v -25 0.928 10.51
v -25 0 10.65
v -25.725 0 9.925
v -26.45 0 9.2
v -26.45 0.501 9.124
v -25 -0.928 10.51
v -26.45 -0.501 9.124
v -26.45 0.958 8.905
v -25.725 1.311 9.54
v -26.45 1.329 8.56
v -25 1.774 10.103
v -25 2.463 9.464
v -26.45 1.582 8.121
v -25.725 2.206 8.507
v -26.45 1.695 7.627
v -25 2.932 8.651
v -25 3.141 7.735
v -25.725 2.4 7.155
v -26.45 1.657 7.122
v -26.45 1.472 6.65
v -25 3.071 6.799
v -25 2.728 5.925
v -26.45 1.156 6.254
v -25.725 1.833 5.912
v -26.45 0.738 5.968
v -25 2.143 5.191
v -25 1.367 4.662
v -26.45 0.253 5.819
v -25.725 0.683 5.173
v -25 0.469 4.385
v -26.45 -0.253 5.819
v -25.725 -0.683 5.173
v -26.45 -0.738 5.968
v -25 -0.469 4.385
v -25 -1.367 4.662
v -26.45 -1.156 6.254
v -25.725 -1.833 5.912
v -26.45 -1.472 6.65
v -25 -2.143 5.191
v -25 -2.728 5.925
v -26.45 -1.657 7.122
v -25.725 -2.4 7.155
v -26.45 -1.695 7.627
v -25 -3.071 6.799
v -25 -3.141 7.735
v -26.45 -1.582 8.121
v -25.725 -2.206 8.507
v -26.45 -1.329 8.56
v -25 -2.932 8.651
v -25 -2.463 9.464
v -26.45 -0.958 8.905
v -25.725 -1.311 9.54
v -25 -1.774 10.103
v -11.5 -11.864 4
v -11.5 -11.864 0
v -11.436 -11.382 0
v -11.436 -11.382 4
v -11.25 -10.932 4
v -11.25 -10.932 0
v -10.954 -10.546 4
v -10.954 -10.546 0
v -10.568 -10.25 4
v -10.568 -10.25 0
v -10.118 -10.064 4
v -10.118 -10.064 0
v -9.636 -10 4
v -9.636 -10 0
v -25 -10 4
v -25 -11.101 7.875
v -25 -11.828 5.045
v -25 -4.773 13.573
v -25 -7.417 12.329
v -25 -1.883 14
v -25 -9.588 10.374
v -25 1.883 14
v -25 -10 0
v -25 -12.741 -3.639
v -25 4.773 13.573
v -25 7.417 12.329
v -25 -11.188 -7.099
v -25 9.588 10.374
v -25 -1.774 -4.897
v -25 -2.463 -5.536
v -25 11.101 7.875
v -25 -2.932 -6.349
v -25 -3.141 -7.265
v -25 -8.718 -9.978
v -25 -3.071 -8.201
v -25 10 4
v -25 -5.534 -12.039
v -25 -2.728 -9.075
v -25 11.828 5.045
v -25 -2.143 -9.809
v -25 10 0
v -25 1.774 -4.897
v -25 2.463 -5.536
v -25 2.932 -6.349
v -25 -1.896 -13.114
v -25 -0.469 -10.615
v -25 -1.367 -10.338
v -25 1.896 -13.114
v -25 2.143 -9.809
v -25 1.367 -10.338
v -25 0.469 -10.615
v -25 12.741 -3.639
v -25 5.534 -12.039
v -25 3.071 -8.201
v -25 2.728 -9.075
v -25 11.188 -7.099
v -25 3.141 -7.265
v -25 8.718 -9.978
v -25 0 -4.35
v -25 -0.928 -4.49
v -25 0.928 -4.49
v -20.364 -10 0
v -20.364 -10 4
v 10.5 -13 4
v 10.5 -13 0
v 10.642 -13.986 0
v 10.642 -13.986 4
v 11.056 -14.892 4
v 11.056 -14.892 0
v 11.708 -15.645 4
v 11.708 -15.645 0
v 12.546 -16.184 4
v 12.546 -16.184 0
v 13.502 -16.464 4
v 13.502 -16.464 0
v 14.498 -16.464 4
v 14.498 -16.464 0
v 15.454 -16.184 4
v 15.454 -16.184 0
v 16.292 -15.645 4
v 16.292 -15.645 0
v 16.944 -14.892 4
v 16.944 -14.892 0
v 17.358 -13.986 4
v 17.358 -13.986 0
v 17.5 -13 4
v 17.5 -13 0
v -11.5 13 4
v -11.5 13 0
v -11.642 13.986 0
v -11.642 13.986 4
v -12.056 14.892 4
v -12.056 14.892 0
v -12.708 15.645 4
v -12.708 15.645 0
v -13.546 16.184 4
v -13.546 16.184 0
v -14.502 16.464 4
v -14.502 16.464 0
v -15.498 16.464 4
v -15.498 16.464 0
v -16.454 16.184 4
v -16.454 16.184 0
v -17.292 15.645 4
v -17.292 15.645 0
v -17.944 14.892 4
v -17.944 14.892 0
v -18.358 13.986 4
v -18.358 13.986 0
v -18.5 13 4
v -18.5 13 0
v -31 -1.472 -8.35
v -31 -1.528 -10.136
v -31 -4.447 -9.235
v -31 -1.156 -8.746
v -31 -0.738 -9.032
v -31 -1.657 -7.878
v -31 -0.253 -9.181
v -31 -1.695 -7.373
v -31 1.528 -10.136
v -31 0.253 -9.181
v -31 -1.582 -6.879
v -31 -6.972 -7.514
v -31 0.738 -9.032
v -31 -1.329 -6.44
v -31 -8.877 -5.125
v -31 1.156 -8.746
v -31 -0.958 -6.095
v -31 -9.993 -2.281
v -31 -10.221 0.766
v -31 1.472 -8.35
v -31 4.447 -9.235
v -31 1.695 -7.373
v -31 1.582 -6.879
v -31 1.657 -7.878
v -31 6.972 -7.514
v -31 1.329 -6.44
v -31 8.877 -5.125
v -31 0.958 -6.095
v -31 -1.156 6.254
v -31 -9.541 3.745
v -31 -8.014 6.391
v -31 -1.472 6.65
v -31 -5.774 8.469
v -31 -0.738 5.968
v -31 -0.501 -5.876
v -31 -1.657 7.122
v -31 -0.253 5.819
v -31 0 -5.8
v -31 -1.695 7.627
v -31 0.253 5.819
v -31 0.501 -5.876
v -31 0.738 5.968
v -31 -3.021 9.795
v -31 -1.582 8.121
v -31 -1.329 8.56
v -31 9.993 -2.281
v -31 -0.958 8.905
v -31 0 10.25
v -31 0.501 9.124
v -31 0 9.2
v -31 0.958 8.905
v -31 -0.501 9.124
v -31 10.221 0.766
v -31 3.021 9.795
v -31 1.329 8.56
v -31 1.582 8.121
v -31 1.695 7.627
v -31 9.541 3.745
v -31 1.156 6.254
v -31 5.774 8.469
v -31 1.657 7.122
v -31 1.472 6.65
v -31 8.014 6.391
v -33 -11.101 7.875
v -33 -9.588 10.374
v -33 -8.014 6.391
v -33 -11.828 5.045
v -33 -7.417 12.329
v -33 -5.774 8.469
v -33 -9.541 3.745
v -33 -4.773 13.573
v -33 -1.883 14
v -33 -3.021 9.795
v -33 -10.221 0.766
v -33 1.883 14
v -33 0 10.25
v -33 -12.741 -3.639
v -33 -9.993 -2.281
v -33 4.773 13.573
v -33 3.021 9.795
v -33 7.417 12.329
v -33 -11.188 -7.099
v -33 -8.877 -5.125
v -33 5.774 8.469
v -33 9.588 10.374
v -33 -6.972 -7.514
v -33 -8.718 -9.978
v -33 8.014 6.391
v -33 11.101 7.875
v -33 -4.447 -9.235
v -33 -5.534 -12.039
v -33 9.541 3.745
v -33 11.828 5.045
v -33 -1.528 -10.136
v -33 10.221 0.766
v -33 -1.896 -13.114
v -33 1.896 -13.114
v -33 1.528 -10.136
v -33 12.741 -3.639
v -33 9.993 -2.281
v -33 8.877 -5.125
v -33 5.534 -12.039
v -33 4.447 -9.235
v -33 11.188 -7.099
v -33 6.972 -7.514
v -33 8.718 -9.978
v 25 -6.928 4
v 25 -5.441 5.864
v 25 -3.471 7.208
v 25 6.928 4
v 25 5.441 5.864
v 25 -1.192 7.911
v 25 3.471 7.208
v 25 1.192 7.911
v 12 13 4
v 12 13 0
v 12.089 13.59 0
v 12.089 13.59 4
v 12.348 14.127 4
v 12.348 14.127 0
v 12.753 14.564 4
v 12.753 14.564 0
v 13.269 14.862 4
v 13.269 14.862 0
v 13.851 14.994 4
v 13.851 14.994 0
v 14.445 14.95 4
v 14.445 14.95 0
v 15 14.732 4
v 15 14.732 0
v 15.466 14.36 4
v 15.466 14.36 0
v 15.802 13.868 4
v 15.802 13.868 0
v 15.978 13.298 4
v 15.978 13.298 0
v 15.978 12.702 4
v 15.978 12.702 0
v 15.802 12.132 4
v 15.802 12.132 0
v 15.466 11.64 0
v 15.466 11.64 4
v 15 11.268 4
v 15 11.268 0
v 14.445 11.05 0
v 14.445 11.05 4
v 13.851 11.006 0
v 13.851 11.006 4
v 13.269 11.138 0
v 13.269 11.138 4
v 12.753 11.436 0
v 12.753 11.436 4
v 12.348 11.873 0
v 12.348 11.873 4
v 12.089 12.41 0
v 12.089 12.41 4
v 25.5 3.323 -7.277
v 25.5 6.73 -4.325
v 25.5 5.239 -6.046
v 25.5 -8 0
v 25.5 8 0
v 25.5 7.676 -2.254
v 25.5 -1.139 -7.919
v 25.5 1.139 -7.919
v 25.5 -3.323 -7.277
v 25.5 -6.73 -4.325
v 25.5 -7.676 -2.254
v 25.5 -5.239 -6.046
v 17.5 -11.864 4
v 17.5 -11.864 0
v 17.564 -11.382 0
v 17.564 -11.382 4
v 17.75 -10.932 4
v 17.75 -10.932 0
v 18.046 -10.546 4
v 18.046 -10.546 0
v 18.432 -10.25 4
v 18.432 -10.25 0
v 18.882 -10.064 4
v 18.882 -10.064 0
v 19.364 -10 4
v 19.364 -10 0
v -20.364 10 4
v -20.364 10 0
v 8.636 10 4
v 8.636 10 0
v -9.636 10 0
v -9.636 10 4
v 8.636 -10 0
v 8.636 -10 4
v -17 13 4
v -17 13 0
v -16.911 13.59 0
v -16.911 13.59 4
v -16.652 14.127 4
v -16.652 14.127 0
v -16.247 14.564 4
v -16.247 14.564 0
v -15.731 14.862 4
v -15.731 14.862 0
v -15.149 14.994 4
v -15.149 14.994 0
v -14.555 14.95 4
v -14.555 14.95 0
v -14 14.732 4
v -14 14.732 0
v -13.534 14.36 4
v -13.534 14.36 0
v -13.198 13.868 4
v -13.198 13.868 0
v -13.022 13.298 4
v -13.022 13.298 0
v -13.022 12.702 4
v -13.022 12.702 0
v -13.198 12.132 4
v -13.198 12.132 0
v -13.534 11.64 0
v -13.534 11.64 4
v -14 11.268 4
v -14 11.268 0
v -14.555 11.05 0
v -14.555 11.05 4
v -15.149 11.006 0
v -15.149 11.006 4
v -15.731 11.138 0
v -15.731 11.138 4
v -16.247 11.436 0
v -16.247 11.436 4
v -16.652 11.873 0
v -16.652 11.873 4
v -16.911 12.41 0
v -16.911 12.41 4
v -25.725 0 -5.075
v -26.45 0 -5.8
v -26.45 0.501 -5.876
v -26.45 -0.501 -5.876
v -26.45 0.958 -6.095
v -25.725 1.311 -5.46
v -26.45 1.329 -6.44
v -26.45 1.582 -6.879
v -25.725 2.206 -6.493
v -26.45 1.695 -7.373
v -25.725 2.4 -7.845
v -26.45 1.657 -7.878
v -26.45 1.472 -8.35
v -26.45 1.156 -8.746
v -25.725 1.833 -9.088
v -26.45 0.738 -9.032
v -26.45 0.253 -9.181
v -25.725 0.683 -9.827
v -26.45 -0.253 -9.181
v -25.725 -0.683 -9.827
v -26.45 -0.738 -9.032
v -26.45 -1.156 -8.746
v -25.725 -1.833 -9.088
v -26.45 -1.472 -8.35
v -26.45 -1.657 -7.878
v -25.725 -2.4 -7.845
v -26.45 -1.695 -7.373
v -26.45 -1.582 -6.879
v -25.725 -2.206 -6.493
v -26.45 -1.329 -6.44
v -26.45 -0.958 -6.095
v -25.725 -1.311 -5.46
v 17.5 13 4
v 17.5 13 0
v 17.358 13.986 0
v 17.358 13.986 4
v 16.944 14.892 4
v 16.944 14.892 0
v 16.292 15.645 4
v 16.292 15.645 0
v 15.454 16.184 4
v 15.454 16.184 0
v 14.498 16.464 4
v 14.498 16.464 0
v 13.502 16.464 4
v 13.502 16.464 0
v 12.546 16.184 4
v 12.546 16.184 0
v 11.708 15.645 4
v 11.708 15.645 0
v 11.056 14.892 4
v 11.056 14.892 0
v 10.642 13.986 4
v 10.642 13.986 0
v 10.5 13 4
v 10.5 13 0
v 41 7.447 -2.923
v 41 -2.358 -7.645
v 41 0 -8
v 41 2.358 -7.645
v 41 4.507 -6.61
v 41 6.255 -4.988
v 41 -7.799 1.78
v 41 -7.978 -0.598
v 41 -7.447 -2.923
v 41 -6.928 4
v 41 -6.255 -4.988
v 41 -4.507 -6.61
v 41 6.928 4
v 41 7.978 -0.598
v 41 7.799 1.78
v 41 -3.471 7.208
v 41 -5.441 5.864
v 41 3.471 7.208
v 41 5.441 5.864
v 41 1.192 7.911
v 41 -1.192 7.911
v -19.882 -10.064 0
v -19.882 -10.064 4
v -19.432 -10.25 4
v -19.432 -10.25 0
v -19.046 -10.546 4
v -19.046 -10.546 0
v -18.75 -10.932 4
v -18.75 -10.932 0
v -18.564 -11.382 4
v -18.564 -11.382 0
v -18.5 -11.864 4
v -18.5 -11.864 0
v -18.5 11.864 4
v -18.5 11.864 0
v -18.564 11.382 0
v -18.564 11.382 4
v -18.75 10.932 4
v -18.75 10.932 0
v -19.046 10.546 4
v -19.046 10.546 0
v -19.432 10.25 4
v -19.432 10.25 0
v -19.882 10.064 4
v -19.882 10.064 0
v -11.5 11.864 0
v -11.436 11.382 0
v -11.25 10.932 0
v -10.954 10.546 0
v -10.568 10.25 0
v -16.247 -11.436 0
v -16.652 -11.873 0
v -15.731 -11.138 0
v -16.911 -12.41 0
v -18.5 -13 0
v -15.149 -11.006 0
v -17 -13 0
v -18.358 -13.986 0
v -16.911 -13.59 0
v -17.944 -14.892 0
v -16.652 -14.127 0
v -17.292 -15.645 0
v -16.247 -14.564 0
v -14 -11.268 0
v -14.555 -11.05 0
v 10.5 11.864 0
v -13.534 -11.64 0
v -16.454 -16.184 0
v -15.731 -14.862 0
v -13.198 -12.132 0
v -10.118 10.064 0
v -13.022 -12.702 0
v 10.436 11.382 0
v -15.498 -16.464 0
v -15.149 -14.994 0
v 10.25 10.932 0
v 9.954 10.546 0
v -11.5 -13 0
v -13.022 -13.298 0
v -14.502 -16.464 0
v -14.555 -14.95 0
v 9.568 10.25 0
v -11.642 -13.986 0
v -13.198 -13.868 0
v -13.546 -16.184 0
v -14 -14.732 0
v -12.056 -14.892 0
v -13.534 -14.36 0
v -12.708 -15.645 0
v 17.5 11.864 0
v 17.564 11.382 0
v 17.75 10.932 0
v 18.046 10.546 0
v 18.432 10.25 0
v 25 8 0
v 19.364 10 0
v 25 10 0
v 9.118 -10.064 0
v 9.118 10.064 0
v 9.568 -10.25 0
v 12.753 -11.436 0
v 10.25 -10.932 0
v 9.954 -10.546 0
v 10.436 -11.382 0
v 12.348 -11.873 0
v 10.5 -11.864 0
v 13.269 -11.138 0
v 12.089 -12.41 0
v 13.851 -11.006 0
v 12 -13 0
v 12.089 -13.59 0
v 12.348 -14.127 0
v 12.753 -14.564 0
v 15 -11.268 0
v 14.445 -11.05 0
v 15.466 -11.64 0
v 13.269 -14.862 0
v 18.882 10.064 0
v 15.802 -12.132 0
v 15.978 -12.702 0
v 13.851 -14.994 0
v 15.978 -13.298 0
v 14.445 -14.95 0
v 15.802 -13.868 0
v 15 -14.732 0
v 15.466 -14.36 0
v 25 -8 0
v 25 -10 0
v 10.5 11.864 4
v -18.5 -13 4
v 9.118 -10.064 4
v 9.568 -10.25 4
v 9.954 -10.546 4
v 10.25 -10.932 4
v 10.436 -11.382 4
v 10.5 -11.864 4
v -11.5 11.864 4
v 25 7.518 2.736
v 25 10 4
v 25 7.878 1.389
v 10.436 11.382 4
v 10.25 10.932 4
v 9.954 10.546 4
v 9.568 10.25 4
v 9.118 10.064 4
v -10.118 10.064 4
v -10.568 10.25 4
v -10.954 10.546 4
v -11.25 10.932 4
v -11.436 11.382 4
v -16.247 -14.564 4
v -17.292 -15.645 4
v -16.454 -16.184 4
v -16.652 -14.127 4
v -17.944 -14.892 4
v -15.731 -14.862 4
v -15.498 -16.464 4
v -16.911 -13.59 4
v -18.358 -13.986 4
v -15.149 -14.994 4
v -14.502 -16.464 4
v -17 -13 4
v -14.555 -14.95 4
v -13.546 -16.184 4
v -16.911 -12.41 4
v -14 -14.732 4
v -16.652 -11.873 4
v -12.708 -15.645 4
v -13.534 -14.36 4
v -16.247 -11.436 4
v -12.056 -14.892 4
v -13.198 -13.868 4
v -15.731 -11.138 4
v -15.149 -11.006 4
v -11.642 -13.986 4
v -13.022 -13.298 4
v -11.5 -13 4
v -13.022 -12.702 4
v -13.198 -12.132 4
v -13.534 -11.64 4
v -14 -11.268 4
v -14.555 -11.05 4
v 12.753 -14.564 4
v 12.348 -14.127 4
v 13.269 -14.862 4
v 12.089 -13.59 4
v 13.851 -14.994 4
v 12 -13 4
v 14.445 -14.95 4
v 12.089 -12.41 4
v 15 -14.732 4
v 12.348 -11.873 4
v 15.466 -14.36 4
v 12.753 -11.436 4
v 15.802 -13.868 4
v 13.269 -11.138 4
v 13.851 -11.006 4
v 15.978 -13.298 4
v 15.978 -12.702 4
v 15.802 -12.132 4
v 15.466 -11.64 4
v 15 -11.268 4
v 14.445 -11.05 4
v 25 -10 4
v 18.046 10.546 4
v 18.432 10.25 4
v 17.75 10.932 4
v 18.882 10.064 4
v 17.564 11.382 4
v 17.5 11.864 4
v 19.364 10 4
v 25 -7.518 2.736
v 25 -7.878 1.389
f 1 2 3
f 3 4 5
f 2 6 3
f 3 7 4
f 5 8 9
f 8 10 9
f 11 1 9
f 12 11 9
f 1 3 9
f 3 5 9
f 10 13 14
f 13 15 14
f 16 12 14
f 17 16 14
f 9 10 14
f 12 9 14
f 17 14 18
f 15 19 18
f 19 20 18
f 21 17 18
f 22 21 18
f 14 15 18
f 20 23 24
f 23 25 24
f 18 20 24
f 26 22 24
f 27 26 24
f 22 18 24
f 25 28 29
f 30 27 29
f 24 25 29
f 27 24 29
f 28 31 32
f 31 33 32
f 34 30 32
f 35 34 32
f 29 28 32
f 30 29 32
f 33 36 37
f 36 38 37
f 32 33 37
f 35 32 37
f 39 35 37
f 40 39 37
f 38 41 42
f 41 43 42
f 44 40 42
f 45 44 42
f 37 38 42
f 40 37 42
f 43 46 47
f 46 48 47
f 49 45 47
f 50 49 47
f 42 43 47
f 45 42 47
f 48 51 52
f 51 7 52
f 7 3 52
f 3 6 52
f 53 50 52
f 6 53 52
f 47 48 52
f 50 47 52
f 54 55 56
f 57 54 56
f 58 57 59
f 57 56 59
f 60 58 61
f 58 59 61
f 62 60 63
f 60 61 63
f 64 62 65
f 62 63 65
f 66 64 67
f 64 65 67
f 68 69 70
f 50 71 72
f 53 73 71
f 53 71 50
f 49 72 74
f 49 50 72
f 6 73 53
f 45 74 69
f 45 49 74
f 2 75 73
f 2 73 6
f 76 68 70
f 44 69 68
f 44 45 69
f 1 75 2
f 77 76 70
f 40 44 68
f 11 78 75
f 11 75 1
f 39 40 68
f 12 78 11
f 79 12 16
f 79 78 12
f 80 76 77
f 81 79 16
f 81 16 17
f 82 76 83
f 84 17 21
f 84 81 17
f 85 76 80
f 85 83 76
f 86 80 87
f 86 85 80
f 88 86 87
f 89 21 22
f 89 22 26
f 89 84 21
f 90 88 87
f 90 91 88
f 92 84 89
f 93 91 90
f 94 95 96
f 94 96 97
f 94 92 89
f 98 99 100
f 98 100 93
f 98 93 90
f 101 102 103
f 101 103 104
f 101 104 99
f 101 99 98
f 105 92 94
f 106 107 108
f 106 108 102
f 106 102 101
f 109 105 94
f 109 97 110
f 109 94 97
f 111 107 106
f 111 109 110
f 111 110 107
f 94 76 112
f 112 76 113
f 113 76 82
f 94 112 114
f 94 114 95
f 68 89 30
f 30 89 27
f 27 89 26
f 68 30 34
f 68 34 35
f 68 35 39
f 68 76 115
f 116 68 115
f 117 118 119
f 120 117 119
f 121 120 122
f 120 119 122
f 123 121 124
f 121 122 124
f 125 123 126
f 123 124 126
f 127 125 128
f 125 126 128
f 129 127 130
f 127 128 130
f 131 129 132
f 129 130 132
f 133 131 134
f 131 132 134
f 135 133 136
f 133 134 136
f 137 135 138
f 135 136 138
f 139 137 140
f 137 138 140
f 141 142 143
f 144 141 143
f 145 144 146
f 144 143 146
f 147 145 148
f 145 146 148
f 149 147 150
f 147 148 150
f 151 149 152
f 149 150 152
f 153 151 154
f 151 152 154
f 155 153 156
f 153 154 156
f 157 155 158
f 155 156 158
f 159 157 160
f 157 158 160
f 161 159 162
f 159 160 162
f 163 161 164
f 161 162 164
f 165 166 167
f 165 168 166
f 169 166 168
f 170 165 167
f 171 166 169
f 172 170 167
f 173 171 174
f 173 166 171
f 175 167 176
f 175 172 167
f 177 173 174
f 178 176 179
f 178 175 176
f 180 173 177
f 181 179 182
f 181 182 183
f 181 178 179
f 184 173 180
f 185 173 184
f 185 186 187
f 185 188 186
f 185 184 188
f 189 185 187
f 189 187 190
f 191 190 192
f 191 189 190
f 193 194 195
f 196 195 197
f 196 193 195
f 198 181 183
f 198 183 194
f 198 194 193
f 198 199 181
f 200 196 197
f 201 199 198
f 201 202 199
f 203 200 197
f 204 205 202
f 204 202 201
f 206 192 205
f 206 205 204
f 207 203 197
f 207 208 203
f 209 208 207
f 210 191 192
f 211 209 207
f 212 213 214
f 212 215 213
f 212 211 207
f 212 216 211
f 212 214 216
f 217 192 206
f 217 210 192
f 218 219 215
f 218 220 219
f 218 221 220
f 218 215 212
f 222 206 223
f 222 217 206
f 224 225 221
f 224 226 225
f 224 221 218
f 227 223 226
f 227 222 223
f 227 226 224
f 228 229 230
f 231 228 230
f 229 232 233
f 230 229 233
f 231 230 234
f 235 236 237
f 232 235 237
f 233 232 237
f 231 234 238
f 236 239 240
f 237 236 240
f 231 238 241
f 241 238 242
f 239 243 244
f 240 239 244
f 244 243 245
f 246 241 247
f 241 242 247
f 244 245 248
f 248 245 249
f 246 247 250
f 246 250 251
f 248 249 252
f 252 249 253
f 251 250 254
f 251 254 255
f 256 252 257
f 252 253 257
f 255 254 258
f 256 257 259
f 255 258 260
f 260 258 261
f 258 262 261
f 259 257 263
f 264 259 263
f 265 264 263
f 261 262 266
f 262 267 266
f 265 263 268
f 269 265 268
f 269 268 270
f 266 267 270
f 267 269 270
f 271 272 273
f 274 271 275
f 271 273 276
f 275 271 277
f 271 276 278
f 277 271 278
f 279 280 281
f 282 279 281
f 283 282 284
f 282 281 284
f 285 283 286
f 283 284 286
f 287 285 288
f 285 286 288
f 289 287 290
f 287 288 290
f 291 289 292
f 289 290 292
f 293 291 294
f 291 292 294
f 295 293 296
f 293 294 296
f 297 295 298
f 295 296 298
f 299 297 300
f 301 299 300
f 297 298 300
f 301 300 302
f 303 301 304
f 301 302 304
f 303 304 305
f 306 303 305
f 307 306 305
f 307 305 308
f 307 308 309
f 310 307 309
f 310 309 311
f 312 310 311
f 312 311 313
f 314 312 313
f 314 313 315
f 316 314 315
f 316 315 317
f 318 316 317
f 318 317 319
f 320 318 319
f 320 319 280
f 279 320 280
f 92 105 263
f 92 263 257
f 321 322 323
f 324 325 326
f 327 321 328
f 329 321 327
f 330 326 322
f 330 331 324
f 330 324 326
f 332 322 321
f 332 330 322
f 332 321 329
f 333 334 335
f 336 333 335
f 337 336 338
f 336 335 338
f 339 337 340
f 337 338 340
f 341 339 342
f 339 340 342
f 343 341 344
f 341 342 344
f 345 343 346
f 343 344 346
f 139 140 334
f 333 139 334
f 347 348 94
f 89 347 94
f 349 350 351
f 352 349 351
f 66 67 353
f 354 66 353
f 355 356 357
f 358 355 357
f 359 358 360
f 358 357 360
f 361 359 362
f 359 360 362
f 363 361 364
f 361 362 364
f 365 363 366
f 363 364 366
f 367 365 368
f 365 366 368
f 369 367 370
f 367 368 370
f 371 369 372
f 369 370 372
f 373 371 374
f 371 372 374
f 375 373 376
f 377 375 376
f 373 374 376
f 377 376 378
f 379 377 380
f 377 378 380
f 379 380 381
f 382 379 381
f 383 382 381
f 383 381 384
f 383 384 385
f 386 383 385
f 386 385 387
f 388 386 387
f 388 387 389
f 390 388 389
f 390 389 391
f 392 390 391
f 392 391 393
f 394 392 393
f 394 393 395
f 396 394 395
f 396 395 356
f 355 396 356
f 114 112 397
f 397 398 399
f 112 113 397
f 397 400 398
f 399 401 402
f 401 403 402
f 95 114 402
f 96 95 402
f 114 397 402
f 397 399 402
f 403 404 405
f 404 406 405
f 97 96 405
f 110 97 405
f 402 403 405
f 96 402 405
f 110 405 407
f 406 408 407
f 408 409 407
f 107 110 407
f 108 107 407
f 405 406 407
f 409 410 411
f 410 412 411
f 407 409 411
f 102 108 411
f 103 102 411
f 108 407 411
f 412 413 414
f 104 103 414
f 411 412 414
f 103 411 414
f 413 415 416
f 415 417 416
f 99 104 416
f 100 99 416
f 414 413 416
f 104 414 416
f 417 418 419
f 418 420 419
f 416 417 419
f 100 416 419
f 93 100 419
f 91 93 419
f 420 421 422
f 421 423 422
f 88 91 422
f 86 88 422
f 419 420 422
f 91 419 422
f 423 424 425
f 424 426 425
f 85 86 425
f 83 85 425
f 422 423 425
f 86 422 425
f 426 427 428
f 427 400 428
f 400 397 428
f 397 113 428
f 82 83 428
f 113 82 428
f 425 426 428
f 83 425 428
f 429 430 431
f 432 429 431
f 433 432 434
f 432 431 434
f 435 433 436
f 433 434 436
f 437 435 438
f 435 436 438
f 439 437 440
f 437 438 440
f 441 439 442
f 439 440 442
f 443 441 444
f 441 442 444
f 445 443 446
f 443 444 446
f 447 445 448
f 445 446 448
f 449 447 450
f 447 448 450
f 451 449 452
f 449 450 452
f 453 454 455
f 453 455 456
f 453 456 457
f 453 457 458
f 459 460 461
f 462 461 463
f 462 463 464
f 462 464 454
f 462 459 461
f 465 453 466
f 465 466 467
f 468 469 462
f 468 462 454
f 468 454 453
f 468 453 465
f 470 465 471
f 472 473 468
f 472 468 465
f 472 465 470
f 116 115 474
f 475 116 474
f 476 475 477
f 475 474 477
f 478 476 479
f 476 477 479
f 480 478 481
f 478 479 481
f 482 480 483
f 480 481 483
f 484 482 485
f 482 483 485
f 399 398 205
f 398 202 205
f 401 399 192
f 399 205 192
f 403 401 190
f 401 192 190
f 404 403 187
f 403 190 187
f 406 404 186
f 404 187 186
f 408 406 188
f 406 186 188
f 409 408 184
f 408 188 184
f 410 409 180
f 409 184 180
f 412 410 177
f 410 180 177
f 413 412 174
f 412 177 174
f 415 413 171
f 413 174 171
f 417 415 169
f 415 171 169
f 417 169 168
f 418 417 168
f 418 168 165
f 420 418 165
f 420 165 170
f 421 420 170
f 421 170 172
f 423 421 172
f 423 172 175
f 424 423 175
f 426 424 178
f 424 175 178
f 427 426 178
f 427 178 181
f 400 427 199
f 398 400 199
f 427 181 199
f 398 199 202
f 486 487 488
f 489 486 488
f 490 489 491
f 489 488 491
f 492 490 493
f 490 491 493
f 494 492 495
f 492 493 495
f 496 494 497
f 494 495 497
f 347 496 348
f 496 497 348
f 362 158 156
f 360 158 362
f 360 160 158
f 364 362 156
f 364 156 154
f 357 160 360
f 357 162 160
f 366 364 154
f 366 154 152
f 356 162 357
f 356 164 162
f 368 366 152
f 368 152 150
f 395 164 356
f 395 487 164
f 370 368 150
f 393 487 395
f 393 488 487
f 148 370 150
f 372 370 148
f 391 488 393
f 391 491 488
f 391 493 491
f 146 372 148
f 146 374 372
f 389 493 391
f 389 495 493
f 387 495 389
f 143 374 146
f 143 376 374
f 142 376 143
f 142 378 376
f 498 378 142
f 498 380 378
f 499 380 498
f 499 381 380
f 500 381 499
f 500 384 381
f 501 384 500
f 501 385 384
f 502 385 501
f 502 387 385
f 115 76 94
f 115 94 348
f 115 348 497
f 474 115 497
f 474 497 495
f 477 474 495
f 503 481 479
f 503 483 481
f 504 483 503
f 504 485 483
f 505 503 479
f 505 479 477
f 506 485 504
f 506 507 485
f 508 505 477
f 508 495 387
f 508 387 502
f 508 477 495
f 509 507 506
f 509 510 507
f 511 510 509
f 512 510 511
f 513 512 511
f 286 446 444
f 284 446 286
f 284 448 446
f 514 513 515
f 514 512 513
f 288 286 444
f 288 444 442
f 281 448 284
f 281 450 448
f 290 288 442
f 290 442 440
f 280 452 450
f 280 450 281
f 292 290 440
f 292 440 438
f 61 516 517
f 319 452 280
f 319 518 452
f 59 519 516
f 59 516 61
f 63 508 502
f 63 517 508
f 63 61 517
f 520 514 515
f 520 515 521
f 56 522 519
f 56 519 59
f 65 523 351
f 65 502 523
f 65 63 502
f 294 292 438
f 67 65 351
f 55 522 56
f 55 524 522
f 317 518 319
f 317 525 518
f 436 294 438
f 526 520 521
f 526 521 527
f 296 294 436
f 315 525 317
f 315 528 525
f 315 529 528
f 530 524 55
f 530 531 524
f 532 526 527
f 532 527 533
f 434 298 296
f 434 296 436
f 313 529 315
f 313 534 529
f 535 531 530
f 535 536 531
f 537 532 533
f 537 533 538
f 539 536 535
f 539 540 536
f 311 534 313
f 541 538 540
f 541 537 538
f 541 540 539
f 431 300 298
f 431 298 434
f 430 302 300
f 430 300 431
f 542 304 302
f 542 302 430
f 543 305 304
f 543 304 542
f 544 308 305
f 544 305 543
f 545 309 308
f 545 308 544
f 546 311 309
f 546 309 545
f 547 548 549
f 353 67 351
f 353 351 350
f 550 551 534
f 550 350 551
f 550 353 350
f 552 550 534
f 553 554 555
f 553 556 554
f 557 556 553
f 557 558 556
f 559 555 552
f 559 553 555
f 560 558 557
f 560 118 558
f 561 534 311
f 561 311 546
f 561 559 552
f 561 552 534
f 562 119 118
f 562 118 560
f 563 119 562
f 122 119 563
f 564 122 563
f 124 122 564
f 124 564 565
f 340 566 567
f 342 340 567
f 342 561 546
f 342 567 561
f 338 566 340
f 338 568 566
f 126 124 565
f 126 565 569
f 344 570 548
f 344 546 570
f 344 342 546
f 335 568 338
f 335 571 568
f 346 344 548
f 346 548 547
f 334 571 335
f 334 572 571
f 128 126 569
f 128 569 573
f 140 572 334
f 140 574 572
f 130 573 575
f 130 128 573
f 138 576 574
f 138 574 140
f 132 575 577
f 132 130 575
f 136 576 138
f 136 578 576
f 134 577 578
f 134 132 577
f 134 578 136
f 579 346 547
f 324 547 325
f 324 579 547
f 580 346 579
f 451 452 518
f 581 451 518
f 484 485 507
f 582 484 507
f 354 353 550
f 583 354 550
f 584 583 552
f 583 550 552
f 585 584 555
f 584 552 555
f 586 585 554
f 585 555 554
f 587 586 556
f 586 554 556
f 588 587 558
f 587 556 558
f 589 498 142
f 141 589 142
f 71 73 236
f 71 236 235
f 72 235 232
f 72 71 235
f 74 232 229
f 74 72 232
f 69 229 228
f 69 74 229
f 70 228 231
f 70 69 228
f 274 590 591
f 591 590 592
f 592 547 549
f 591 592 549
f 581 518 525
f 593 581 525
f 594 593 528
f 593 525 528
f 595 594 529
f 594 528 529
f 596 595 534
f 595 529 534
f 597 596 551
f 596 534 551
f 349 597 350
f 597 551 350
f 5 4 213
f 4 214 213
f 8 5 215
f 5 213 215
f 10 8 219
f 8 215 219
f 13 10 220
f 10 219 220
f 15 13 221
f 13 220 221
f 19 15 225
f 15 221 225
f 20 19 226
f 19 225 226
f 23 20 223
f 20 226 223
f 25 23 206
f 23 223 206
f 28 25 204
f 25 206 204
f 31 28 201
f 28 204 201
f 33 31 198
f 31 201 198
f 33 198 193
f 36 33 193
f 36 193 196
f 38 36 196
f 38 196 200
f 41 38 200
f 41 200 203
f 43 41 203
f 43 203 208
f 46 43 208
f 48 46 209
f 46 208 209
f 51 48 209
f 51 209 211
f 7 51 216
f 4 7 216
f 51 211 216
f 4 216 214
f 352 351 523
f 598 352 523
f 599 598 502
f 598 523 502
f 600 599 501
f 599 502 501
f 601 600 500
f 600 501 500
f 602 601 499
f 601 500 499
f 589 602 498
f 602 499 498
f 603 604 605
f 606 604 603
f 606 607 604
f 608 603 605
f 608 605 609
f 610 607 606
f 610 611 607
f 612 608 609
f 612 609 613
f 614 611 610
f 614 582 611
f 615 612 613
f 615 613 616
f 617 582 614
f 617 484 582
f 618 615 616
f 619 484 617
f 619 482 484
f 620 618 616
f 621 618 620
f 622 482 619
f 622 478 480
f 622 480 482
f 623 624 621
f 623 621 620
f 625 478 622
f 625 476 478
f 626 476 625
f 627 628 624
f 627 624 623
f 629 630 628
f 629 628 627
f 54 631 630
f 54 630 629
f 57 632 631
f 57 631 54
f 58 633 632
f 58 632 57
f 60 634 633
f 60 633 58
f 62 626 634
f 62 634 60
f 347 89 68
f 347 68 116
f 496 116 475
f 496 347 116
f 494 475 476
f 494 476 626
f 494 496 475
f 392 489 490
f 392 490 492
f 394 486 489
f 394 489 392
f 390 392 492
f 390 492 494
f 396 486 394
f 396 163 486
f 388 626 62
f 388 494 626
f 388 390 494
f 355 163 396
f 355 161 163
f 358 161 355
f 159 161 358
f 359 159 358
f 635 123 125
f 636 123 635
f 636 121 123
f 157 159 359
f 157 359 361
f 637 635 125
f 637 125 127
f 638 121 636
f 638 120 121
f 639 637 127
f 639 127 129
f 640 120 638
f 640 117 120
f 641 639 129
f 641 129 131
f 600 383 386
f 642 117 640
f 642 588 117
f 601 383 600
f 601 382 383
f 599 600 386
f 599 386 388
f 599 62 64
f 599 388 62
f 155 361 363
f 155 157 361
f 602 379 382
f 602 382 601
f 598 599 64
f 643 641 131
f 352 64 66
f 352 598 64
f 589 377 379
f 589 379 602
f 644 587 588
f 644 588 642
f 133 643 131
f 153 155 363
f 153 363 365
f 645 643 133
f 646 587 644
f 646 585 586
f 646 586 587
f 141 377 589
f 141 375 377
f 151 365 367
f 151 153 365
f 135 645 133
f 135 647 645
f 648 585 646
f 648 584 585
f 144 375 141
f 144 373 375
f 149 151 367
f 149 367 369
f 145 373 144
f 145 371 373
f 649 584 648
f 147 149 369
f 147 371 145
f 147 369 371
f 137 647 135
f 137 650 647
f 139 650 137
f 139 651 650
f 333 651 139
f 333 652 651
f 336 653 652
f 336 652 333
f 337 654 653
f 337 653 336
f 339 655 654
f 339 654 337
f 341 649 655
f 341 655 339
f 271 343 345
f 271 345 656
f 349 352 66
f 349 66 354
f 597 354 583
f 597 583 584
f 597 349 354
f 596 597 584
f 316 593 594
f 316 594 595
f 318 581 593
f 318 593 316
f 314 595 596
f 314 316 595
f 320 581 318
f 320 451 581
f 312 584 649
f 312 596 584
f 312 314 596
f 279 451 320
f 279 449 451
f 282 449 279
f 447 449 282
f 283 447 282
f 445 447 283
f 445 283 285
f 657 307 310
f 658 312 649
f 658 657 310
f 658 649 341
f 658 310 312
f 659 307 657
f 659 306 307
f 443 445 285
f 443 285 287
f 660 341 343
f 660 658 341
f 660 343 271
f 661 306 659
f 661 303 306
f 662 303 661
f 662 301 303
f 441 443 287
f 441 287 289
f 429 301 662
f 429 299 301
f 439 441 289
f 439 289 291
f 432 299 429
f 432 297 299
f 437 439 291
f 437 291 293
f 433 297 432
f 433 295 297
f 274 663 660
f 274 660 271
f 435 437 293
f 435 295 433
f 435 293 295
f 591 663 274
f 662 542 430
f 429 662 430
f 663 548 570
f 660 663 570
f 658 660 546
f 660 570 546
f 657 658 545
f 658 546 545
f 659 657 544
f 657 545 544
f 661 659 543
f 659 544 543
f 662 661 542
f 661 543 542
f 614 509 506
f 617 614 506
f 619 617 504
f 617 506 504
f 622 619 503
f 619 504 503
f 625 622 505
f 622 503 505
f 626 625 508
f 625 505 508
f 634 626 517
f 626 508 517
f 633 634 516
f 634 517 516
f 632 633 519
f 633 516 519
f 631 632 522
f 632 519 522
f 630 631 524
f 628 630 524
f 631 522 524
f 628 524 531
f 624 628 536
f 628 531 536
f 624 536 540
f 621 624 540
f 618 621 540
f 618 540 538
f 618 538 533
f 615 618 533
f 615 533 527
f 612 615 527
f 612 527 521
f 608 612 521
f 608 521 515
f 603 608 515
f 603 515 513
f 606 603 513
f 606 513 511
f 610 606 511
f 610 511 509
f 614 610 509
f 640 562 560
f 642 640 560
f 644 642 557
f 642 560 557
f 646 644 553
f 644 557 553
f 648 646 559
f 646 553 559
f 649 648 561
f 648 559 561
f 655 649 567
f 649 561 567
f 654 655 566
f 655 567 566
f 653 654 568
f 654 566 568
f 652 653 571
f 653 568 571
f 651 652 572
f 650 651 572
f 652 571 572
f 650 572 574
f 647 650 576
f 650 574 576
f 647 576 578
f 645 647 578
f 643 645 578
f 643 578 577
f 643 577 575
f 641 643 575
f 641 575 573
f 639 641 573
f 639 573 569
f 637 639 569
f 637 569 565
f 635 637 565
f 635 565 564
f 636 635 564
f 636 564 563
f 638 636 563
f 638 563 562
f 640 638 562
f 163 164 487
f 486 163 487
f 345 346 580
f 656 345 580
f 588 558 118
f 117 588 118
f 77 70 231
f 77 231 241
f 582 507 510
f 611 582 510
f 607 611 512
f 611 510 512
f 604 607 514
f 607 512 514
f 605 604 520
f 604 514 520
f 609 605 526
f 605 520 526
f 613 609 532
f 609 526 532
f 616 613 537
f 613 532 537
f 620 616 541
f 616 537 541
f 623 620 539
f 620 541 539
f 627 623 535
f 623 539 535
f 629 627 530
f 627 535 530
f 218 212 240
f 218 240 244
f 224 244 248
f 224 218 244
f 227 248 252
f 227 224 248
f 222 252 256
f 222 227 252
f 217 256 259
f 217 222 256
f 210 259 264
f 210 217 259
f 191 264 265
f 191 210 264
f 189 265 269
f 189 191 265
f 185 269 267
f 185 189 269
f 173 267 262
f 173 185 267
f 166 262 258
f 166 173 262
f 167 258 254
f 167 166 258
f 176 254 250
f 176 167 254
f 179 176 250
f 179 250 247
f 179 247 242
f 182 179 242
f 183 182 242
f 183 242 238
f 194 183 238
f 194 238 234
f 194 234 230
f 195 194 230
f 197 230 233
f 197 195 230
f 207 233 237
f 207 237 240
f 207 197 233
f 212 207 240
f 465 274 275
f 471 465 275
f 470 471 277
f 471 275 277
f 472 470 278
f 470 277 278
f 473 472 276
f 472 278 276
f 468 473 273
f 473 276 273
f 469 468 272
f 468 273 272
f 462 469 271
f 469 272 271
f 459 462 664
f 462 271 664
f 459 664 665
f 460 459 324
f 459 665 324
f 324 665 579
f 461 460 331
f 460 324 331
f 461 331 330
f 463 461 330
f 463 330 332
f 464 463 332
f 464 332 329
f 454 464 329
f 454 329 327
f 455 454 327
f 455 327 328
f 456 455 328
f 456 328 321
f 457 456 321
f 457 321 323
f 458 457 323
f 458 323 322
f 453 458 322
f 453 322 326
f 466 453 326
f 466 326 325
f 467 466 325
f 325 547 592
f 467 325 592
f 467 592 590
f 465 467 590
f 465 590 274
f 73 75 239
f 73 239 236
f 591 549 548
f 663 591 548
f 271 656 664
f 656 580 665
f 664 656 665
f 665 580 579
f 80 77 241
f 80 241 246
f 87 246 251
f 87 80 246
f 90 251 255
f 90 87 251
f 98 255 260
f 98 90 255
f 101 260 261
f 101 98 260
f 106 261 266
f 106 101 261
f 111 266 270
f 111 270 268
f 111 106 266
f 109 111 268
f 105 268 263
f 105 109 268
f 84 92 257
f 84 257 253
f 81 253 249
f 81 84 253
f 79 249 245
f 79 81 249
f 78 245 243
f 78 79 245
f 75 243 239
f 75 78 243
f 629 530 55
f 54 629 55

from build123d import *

# Parameters (mm, degrees)
BOSS_EXTRU_1_DEPTH                             = 4
BOSS_EXTRU_2_DEPTH                             = 8
ENL_V_START                                    = -2
ESQUISSE3_R                                    = 10.25
ENL_V_MAT_EXTRU_1_DEPTH                        = 2
ESQUISSE6_R                                    = 2
ENL_V_MAT_EXTRU_2_DEPTH                        = 40.462007045
ESQUISSE7_R                                    = 8
BOSS_EXTRU_5_DEPTH                             = 16
ENL_V_MAT_EXTRU_3_DEPTH                        = 51.786317055
ENL_V_MAT_EXTRU_3_DEPTH_BACK                   = 51.786317055
ESQUISSE9_W                                    = 0.5
ESQUISSE9_H                                    = 9.601810628
FRAISAGE_POUR_VIS_T_TE_FRAIS_E_M31_D           = 3.4
FRAISAGE_POUR_VIS_T_TE_FRAIS_E_M31_DEPTH       = 8
FRAISAGE_POUR_VIS_T_TE_FRAIS_E_M31_CSINK_D     = 6.3
FRAISAGE_POUR_VIS_T_TE_FRAIS_E_M31_CSINK_ANGLE = 90


with BuildPart() as part:
    # Esquisse1 → Boss.-Extru.1 (new body)
    with BuildSketch(Plane.XY):
        with BuildLine():
            Line((25, -10), (25, 10))
            Line((25, 10), (19.364230348, 10))
            ThreePointArc((19.364230348, 10), (18.046020427, 10.546020427), (17.5, 11.864230348))
            Line((17.5, 11.864230348), (17.5, 13))
            ThreePointArc((17.5, 13), (14, 16.5), (10.5, 13))
            Line((10.5, 13), (10.5, 11.864230348))
            ThreePointArc((10.5, 11.864230348), (9.953979573, 10.546020427), (8.635769652, 10))
            Line((8.635769652, 10), (-9.635769652, 10))
            ThreePointArc((-9.635769652, 10), (-10.953979573, 10.546020427), (-11.5, 11.864230348))
            Line((-11.5, 11.864230348), (-11.5, 13))
            ThreePointArc((-11.5, 13), (-15, 16.5), (-18.5, 13))
            Line((-18.5, 13), (-18.5, 11.864230348))
            ThreePointArc((-18.5, 11.864230348), (-19.046020427, 10.546020427), (-20.364230348, 10))
            Line((-20.364230348, 10), (-25, 10))
            Line((-25, 10), (-25, -10))
            Line((-25, -10), (-20.364230348, -10))
            ThreePointArc((-20.364230348, -10), (-19.046020427, -10.546020427), (-18.5, -11.864230348))
            Line((-18.5, -11.864230348), (-18.5, -13))
            ThreePointArc((-18.5, -13), (-15, -16.5), (-11.5, -13))
            Line((-11.5, -13), (-11.5, -11.864230348))
            ThreePointArc((-11.5, -11.864230348), (-10.953979573, -10.546020427), (-9.635769652, -10))
            Line((-9.635769652, -10), (8.635769652, -10))
            ThreePointArc((8.635769652, -10), (9.953979573, -10.546020427), (10.5, -11.864230348))
            Line((10.5, -11.864230348), (10.5, -13))
            ThreePointArc((10.5, -13), (14, -16.5), (17.5, -13))
            Line((17.5, -13), (17.5, -11.864230348))
            ThreePointArc((17.5, -11.864230348), (18.046020427, -10.546020427), (19.364230348, -10))
            Line((19.364230348, -10), (25, -10))
        make_face()
    extrude(amount=BOSS_EXTRU_1_DEPTH)

    # Esquisse2 → Boss.-Extru.2 (add)
    with BuildSketch(Plane.ZY.offset(25)):
        with BuildLine():
            Line((-3.638732785, 12.740569992), (5.045284633, 11.827842982))
            ThreePointArc((5.045284633, 11.827842982), (11.431448255, 8.573930092), (14, 1.882624029))
            Line((14, 1.882624029), (14, -1.882624029))
            ThreePointArc((14, -1.882624029), (11.431448255, -8.573930092), (5.045284633, -11.827842982))
            Line((5.045284633, -11.827842982), (-3.638732785, -12.740569992))
            ThreePointArc((-3.638732785, -12.740569992), (-13.25, 0), (-3.638732785, 12.740569992))
        make_face()
    extrude(amount=BOSS_EXTRU_2_DEPTH)

    # Esquisse3 → Enlèv. mat.-Extru.1 (cut)
    with BuildSketch(Plane.ZY.offset(33).offset(ENL_V_START)):
        Circle(ESQUISSE3_R)
    extrude(amount=ENL_V_MAT_EXTRU_1_DEPTH, mode=Mode.SUBTRACT)

    # Esquisse6 → Enlèv. mat.-Extru.2 (cut, through all)
    with BuildSketch(Plane(origin=(0, 0, 0), x_dir=(-1, 0, 0), z_dir=(0, 0, -1))):
        with Locations((15, -13)):
            Circle(ESQUISSE6_R)
        with Locations((-14, -13)):
            Circle(ESQUISSE6_R)
        with Locations((-14, 13)):
            Circle(ESQUISSE6_R)
        with Locations((15, 13)):
            Circle(ESQUISSE6_R)
    extrude(amount=-ENL_V_MAT_EXTRU_2_DEPTH, mode=Mode.SUBTRACT)

    # Esquisse7 → Boss.-Extru.5 (add)
    with BuildSketch(Plane(origin=(25, 0, 0), x_dir=(0, 0, -1), z_dir=(1, 0, 0))):
        with Locations(Location((0, 0, 0), (0, 0, 120))):
            Circle(ESQUISSE7_R)
    extrude(amount=BOSS_EXTRU_5_DEPTH)

    # Esquisse9 → Enlèv. mat.-Extru.3 (cut, two sides: drawn at the far end of the back side and taken through both)
    with BuildSketch(Plane(origin=(0, 10, 0), x_dir=(1, 0, 0), z_dir=(0, 1, 0)).offset(-ENL_V_MAT_EXTRU_3_DEPTH_BACK)):
        with Locations((25.25, 4.800905314)):
            Rectangle(ESQUISSE9_W, ESQUISSE9_H)
    extrude(amount=ENL_V_MAT_EXTRU_3_DEPTH + ENL_V_MAT_EXTRU_3_DEPTH_BACK, mode=Mode.SUBTRACT)

    # Fraisage pour vis à tête fraisée M31
    with Locations(Plane(origin=(-25, 0, 0), x_dir=(0, 0, -1), z_dir=(1, 0, 0))):
        with Locations((-7.5, 0), (7.5, 0)):
            CounterSinkHole(FRAISAGE_POUR_VIS_T_TE_FRAIS_E_M31_D / 2, FRAISAGE_POUR_VIS_T_TE_FRAIS_E_M31_CSINK_D / 2, depth=FRAISAGE_POUR_VIS_T_TE_FRAIS_E_M31_DEPTH, counter_sink_angle=FRAISAGE_POUR_VIS_T_TE_FRAIS_E_M31_CSINK_ANGLE)


solid = part.part
